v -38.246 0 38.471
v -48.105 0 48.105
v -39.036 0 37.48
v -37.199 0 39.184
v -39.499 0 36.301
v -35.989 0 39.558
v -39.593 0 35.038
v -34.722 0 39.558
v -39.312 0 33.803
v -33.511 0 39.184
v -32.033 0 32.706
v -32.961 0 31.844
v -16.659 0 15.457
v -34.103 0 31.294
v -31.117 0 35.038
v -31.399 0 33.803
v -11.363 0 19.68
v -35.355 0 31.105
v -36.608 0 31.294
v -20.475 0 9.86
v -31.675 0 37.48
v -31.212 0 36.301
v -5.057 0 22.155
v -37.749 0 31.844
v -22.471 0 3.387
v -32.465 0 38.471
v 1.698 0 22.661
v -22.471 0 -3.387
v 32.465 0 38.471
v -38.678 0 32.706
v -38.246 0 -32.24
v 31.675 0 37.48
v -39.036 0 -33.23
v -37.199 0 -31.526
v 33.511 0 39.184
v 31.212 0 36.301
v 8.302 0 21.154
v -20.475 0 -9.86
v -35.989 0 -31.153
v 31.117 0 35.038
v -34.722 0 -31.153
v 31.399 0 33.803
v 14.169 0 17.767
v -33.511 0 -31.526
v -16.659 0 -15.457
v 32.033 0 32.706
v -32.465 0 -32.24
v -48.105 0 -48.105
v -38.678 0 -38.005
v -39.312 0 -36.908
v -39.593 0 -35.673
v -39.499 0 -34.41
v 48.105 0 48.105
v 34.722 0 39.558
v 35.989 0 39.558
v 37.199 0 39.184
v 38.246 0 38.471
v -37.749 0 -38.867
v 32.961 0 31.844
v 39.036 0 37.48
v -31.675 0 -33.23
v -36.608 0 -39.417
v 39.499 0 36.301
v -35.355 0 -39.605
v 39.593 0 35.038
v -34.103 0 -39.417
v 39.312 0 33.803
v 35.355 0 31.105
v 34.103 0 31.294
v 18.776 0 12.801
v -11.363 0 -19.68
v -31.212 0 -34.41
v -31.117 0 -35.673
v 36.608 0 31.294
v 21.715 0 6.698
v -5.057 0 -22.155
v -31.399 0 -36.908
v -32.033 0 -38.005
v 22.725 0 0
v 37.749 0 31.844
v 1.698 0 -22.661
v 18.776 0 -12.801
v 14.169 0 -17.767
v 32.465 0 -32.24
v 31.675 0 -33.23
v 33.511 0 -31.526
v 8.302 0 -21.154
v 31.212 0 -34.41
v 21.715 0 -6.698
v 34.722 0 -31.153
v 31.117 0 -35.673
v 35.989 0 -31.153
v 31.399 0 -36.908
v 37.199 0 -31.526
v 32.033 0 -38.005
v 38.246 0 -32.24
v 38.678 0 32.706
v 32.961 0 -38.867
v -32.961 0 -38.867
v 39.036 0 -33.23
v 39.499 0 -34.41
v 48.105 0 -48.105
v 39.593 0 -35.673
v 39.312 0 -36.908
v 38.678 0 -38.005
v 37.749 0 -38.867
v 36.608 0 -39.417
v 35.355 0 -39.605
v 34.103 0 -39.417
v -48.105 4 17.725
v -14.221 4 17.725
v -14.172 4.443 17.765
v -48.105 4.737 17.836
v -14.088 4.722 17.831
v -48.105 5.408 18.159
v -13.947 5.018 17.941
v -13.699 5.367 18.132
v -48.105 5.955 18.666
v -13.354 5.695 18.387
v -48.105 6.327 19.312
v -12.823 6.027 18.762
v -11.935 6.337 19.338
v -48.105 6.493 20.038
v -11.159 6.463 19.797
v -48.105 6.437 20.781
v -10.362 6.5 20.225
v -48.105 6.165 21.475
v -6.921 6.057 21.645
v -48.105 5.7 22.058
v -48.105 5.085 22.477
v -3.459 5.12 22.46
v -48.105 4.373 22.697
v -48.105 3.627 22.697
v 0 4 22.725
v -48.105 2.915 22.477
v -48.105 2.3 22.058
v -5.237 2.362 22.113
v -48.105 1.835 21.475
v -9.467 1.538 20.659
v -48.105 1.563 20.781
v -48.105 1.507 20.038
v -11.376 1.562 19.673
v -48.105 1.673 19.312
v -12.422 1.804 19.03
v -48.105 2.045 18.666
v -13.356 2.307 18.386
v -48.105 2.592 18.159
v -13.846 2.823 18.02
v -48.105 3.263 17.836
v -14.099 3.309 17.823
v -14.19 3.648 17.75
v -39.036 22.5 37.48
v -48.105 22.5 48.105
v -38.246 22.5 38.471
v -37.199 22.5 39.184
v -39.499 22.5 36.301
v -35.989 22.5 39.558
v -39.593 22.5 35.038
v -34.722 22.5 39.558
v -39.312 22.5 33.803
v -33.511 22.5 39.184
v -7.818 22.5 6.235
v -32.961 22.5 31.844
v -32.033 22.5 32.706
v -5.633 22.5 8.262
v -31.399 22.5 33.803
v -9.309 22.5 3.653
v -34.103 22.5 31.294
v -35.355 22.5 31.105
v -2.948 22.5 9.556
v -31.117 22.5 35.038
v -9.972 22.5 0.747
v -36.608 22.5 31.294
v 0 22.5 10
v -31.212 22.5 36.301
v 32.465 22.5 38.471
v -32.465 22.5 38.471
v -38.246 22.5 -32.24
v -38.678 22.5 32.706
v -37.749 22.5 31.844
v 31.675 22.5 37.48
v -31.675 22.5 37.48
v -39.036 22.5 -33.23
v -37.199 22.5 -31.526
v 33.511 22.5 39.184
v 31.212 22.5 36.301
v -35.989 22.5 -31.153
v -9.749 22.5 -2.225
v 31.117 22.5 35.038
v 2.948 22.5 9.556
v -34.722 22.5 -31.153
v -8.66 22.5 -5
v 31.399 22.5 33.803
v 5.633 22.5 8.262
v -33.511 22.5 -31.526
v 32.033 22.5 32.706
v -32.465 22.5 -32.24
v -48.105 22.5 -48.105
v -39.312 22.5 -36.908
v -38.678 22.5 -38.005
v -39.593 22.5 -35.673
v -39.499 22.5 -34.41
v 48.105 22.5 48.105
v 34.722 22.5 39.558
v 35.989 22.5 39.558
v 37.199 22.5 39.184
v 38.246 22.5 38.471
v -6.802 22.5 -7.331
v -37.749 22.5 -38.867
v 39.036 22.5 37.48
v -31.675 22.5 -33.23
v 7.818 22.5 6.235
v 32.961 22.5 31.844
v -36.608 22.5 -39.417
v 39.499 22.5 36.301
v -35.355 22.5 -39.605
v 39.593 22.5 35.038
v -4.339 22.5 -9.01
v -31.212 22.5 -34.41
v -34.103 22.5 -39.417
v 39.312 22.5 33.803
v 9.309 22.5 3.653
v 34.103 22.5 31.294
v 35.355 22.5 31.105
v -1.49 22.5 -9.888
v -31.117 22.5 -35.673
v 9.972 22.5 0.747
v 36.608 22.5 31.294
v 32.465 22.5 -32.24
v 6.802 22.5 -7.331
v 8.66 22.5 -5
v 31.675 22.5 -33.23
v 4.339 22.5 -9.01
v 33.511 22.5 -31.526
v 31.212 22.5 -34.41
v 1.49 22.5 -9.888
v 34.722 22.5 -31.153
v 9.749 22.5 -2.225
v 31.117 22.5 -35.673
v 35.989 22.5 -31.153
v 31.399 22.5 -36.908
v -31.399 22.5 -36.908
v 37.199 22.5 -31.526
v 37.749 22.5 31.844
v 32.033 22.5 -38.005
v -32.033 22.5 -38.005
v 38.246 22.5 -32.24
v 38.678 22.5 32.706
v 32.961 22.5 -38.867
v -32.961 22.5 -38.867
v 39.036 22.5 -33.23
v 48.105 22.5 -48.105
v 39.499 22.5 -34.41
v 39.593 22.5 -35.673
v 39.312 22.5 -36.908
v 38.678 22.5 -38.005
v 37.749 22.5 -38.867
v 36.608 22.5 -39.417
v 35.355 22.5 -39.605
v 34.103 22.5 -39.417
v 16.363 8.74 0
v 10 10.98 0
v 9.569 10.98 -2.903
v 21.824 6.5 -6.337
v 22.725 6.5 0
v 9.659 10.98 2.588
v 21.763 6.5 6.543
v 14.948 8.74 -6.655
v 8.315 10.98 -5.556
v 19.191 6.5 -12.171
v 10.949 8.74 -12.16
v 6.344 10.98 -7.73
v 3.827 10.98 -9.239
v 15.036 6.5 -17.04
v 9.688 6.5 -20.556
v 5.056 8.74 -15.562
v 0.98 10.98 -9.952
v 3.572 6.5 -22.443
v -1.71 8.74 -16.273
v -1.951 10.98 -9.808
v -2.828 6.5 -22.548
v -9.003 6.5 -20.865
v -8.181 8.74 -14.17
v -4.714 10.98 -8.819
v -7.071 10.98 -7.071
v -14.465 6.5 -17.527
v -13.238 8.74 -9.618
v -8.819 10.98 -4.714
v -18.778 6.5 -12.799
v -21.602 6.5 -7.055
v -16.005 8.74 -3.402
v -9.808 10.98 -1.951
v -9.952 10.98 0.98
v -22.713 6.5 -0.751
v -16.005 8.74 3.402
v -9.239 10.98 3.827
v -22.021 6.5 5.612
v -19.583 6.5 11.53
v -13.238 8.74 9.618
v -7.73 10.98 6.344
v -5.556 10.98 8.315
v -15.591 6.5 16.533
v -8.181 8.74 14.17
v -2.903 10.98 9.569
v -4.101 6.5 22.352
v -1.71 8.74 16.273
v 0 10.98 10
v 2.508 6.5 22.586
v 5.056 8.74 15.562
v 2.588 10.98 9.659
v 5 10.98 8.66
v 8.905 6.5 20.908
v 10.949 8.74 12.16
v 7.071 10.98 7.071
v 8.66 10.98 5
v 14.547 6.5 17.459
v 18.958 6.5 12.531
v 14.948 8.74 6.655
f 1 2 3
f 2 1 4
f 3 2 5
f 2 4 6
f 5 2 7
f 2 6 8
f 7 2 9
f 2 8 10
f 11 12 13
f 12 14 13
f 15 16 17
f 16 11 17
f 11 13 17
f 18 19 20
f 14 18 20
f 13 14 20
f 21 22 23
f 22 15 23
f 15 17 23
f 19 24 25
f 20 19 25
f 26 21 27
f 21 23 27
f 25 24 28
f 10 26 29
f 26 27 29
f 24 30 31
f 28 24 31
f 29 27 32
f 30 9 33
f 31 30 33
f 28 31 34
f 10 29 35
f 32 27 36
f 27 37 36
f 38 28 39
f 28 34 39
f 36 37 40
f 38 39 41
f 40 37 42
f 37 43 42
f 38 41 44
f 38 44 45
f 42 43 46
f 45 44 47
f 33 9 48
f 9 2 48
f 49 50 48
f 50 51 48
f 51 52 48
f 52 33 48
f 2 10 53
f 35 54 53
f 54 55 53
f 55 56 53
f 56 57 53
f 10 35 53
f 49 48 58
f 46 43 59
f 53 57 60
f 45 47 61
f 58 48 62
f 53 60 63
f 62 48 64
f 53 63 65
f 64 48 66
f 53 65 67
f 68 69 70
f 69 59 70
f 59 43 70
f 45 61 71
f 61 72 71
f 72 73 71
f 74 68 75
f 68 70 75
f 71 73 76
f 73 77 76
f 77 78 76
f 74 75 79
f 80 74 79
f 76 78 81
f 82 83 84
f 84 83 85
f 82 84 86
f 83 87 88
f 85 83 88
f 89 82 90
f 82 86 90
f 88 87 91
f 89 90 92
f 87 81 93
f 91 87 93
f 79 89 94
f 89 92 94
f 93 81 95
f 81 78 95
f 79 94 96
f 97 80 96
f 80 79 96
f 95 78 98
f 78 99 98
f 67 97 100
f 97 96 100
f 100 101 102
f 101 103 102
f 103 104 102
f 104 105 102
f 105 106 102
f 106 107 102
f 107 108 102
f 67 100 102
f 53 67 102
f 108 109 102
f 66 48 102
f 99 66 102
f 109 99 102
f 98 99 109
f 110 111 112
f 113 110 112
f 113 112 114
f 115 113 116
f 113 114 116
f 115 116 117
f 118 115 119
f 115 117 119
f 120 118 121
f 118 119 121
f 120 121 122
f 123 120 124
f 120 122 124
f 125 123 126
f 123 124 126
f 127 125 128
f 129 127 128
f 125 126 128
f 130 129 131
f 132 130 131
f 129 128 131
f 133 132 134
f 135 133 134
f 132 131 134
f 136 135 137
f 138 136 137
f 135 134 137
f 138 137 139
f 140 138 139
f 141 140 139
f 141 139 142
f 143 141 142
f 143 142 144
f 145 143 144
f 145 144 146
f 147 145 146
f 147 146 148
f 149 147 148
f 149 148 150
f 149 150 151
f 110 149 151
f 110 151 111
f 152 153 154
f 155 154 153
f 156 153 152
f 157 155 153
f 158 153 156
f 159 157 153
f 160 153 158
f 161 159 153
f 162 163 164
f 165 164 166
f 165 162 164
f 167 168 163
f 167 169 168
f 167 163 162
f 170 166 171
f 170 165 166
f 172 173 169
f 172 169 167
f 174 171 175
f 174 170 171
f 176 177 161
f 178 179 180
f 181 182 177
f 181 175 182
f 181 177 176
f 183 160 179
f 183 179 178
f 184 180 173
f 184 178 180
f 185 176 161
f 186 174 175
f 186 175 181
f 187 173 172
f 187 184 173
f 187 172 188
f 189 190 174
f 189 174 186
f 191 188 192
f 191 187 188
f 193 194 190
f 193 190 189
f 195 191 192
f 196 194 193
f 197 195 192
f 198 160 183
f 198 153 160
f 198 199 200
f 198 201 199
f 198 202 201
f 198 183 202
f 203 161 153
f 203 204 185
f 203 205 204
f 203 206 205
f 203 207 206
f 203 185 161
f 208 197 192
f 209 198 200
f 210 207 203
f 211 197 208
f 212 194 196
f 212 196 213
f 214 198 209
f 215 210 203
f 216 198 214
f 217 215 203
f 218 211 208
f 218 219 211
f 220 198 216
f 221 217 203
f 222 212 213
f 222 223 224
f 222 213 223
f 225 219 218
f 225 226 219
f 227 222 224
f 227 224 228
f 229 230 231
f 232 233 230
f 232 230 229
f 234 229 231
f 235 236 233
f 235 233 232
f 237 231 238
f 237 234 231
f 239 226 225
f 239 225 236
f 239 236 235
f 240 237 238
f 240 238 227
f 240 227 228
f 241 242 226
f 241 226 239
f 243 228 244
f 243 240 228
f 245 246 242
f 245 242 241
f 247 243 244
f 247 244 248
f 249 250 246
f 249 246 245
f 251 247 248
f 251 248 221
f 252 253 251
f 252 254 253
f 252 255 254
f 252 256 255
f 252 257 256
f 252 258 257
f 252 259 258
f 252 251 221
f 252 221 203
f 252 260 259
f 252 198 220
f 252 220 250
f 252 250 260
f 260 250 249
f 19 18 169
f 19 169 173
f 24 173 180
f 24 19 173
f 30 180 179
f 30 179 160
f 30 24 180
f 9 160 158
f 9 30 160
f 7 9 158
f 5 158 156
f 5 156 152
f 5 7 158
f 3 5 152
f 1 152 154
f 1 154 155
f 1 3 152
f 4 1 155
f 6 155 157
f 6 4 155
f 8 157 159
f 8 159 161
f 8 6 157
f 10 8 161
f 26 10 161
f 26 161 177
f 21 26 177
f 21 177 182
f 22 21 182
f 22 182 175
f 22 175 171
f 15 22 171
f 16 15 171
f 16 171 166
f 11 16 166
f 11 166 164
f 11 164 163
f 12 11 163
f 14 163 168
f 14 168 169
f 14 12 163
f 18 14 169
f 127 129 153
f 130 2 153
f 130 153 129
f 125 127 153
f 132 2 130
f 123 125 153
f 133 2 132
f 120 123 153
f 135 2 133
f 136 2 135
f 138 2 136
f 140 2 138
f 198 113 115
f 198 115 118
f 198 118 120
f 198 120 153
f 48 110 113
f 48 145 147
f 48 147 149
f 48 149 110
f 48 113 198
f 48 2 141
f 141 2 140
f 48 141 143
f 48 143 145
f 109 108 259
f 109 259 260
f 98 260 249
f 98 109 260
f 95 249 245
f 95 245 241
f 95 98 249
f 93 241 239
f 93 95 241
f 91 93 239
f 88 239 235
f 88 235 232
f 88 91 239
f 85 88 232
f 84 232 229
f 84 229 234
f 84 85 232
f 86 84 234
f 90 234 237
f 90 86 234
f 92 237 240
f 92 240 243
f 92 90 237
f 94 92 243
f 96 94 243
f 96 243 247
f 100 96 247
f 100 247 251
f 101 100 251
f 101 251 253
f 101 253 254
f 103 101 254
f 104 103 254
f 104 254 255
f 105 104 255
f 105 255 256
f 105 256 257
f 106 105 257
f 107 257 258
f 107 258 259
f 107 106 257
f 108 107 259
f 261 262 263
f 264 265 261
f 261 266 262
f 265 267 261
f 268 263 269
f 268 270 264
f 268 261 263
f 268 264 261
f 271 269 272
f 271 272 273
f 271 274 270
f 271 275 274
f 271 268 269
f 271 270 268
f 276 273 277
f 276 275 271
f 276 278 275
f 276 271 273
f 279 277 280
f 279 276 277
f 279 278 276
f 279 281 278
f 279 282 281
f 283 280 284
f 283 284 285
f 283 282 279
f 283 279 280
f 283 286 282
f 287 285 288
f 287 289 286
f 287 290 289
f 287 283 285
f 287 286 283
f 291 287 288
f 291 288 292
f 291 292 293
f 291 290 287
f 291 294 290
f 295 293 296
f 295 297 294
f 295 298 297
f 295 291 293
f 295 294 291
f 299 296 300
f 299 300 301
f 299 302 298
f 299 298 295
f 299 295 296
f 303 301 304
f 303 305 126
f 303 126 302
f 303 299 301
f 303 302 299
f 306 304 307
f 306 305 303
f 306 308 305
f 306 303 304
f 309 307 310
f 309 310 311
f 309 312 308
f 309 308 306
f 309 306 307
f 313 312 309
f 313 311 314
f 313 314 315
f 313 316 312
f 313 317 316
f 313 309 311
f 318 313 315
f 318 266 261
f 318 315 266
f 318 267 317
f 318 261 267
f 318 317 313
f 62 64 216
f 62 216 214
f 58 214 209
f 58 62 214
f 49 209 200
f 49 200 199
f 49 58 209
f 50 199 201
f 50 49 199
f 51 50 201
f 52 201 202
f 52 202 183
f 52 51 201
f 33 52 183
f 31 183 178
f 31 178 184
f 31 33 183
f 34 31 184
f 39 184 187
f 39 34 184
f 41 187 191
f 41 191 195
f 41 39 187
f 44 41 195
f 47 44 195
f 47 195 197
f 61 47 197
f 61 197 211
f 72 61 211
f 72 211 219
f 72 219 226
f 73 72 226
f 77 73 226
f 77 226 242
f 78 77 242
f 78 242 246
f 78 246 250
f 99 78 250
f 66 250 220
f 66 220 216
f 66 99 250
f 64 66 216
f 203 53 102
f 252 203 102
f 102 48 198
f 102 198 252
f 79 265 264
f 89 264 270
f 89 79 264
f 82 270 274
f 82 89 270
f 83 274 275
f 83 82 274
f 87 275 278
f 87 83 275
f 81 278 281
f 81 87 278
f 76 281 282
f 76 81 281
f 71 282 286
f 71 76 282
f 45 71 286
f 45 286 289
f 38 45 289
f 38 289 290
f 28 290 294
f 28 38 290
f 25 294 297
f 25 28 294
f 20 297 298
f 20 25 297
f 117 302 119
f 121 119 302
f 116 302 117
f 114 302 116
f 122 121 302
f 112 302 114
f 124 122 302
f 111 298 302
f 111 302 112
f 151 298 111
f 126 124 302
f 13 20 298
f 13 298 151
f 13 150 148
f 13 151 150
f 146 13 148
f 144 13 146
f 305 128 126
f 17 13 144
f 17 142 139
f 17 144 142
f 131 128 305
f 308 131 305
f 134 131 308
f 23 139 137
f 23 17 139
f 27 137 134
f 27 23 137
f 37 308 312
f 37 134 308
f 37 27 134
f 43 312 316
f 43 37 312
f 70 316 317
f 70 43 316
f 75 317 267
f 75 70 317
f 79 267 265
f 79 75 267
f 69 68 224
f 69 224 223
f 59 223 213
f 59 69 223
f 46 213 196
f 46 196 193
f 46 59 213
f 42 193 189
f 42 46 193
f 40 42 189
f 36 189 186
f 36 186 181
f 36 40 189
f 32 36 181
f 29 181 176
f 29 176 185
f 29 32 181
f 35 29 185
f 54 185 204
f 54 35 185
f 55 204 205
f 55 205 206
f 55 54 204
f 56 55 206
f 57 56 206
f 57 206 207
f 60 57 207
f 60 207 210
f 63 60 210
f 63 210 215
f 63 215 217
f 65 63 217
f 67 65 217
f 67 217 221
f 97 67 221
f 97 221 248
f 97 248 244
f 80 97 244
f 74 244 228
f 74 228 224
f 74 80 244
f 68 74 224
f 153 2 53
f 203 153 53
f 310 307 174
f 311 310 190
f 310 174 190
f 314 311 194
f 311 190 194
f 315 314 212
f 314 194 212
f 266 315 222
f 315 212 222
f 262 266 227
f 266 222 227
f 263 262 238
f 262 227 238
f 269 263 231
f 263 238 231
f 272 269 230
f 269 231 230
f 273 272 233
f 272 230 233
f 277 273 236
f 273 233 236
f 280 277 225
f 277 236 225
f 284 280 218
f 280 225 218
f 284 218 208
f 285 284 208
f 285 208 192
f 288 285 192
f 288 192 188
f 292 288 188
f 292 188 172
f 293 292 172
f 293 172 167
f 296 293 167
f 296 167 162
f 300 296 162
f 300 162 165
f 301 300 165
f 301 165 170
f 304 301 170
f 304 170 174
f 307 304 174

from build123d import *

# Parameters (mm, degrees)
SKETCH1_W                           = 96.210678118
SKETCH1_H                           = 96.210678118
SKETCH1_R                           = 4.25
BODY_EXTRUSION_AND_BOLT_HOLES_DEPTH = 22.5
SKETCH3_R                           = 10
ENTRANCE_DEPTH                      = 22.5
SKETCH5_R                           = 2.5
CUT_EXTRUDE1_DEPTH                  = 100


with BuildPart() as part:
    # Sketch1 → body extrusion and bolt holes (new body)
    with BuildSketch(Plane(origin=(0, 0, 0), x_dir=(1, 0, 0), z_dir=(0, 1, 0))):
        Rectangle(SKETCH1_W, SKETCH1_H)
        with Locations(Location((-35.355339059, 35.355339059, 0), (0, 0, 90))):
            Circle(SKETCH1_R, mode=Mode.SUBTRACT)
        with Locations(Location((35.355339059, 35.355339059, 0), (0, 0, 90))):
            Circle(SKETCH1_R, mode=Mode.SUBTRACT)
        with Locations(Location((35.355339059, -35.355339059, 0), (0, 0, 90))):
            Circle(SKETCH1_R, mode=Mode.SUBTRACT)
        with Locations(Location((-35.355339059, -35.355339059, 0), (0, 0, 90))):
            Circle(SKETCH1_R, mode=Mode.SUBTRACT)
    extrude(amount=BODY_EXTRUSION_AND_BOLT_HOLES_DEPTH)

    # Sketch2 → main chamber (revolve, cut)
    with BuildSketch(Plane.XY):
        Polygon((0, 0), (0, 14.5), (22.725, 6.5), (22.725, 0), align=None)
    revolve(axis=Axis((0, 0, 0), (0, 1, 0)), mode=Mode.SUBTRACT)

    # Sketch3 → entrance (cut)
    with BuildSketch(Plane(origin=(0, 22.5, 0), x_dir=(1, 0, 0), z_dir=(0, 1, 0))):
        with Locations(Location((0, 0, 0), (0, 0, 270))):
            Circle(SKETCH3_R)
    extrude(amount=-ENTRANCE_DEPTH, mode=Mode.SUBTRACT)

    # Sketch5 → Cut-Extrude1 (cut)
    with BuildSketch(Plane(origin=(0, 0, 0), x_dir=(0, 0, -1), z_dir=(1, 0, 0))):
        with Locations((-20.225, 4)):
            Circle(SKETCH5_R)
    extrude(amount=-CUT_EXTRUDE1_DEPTH, mode=Mode.SUBTRACT)


solid = part.part
